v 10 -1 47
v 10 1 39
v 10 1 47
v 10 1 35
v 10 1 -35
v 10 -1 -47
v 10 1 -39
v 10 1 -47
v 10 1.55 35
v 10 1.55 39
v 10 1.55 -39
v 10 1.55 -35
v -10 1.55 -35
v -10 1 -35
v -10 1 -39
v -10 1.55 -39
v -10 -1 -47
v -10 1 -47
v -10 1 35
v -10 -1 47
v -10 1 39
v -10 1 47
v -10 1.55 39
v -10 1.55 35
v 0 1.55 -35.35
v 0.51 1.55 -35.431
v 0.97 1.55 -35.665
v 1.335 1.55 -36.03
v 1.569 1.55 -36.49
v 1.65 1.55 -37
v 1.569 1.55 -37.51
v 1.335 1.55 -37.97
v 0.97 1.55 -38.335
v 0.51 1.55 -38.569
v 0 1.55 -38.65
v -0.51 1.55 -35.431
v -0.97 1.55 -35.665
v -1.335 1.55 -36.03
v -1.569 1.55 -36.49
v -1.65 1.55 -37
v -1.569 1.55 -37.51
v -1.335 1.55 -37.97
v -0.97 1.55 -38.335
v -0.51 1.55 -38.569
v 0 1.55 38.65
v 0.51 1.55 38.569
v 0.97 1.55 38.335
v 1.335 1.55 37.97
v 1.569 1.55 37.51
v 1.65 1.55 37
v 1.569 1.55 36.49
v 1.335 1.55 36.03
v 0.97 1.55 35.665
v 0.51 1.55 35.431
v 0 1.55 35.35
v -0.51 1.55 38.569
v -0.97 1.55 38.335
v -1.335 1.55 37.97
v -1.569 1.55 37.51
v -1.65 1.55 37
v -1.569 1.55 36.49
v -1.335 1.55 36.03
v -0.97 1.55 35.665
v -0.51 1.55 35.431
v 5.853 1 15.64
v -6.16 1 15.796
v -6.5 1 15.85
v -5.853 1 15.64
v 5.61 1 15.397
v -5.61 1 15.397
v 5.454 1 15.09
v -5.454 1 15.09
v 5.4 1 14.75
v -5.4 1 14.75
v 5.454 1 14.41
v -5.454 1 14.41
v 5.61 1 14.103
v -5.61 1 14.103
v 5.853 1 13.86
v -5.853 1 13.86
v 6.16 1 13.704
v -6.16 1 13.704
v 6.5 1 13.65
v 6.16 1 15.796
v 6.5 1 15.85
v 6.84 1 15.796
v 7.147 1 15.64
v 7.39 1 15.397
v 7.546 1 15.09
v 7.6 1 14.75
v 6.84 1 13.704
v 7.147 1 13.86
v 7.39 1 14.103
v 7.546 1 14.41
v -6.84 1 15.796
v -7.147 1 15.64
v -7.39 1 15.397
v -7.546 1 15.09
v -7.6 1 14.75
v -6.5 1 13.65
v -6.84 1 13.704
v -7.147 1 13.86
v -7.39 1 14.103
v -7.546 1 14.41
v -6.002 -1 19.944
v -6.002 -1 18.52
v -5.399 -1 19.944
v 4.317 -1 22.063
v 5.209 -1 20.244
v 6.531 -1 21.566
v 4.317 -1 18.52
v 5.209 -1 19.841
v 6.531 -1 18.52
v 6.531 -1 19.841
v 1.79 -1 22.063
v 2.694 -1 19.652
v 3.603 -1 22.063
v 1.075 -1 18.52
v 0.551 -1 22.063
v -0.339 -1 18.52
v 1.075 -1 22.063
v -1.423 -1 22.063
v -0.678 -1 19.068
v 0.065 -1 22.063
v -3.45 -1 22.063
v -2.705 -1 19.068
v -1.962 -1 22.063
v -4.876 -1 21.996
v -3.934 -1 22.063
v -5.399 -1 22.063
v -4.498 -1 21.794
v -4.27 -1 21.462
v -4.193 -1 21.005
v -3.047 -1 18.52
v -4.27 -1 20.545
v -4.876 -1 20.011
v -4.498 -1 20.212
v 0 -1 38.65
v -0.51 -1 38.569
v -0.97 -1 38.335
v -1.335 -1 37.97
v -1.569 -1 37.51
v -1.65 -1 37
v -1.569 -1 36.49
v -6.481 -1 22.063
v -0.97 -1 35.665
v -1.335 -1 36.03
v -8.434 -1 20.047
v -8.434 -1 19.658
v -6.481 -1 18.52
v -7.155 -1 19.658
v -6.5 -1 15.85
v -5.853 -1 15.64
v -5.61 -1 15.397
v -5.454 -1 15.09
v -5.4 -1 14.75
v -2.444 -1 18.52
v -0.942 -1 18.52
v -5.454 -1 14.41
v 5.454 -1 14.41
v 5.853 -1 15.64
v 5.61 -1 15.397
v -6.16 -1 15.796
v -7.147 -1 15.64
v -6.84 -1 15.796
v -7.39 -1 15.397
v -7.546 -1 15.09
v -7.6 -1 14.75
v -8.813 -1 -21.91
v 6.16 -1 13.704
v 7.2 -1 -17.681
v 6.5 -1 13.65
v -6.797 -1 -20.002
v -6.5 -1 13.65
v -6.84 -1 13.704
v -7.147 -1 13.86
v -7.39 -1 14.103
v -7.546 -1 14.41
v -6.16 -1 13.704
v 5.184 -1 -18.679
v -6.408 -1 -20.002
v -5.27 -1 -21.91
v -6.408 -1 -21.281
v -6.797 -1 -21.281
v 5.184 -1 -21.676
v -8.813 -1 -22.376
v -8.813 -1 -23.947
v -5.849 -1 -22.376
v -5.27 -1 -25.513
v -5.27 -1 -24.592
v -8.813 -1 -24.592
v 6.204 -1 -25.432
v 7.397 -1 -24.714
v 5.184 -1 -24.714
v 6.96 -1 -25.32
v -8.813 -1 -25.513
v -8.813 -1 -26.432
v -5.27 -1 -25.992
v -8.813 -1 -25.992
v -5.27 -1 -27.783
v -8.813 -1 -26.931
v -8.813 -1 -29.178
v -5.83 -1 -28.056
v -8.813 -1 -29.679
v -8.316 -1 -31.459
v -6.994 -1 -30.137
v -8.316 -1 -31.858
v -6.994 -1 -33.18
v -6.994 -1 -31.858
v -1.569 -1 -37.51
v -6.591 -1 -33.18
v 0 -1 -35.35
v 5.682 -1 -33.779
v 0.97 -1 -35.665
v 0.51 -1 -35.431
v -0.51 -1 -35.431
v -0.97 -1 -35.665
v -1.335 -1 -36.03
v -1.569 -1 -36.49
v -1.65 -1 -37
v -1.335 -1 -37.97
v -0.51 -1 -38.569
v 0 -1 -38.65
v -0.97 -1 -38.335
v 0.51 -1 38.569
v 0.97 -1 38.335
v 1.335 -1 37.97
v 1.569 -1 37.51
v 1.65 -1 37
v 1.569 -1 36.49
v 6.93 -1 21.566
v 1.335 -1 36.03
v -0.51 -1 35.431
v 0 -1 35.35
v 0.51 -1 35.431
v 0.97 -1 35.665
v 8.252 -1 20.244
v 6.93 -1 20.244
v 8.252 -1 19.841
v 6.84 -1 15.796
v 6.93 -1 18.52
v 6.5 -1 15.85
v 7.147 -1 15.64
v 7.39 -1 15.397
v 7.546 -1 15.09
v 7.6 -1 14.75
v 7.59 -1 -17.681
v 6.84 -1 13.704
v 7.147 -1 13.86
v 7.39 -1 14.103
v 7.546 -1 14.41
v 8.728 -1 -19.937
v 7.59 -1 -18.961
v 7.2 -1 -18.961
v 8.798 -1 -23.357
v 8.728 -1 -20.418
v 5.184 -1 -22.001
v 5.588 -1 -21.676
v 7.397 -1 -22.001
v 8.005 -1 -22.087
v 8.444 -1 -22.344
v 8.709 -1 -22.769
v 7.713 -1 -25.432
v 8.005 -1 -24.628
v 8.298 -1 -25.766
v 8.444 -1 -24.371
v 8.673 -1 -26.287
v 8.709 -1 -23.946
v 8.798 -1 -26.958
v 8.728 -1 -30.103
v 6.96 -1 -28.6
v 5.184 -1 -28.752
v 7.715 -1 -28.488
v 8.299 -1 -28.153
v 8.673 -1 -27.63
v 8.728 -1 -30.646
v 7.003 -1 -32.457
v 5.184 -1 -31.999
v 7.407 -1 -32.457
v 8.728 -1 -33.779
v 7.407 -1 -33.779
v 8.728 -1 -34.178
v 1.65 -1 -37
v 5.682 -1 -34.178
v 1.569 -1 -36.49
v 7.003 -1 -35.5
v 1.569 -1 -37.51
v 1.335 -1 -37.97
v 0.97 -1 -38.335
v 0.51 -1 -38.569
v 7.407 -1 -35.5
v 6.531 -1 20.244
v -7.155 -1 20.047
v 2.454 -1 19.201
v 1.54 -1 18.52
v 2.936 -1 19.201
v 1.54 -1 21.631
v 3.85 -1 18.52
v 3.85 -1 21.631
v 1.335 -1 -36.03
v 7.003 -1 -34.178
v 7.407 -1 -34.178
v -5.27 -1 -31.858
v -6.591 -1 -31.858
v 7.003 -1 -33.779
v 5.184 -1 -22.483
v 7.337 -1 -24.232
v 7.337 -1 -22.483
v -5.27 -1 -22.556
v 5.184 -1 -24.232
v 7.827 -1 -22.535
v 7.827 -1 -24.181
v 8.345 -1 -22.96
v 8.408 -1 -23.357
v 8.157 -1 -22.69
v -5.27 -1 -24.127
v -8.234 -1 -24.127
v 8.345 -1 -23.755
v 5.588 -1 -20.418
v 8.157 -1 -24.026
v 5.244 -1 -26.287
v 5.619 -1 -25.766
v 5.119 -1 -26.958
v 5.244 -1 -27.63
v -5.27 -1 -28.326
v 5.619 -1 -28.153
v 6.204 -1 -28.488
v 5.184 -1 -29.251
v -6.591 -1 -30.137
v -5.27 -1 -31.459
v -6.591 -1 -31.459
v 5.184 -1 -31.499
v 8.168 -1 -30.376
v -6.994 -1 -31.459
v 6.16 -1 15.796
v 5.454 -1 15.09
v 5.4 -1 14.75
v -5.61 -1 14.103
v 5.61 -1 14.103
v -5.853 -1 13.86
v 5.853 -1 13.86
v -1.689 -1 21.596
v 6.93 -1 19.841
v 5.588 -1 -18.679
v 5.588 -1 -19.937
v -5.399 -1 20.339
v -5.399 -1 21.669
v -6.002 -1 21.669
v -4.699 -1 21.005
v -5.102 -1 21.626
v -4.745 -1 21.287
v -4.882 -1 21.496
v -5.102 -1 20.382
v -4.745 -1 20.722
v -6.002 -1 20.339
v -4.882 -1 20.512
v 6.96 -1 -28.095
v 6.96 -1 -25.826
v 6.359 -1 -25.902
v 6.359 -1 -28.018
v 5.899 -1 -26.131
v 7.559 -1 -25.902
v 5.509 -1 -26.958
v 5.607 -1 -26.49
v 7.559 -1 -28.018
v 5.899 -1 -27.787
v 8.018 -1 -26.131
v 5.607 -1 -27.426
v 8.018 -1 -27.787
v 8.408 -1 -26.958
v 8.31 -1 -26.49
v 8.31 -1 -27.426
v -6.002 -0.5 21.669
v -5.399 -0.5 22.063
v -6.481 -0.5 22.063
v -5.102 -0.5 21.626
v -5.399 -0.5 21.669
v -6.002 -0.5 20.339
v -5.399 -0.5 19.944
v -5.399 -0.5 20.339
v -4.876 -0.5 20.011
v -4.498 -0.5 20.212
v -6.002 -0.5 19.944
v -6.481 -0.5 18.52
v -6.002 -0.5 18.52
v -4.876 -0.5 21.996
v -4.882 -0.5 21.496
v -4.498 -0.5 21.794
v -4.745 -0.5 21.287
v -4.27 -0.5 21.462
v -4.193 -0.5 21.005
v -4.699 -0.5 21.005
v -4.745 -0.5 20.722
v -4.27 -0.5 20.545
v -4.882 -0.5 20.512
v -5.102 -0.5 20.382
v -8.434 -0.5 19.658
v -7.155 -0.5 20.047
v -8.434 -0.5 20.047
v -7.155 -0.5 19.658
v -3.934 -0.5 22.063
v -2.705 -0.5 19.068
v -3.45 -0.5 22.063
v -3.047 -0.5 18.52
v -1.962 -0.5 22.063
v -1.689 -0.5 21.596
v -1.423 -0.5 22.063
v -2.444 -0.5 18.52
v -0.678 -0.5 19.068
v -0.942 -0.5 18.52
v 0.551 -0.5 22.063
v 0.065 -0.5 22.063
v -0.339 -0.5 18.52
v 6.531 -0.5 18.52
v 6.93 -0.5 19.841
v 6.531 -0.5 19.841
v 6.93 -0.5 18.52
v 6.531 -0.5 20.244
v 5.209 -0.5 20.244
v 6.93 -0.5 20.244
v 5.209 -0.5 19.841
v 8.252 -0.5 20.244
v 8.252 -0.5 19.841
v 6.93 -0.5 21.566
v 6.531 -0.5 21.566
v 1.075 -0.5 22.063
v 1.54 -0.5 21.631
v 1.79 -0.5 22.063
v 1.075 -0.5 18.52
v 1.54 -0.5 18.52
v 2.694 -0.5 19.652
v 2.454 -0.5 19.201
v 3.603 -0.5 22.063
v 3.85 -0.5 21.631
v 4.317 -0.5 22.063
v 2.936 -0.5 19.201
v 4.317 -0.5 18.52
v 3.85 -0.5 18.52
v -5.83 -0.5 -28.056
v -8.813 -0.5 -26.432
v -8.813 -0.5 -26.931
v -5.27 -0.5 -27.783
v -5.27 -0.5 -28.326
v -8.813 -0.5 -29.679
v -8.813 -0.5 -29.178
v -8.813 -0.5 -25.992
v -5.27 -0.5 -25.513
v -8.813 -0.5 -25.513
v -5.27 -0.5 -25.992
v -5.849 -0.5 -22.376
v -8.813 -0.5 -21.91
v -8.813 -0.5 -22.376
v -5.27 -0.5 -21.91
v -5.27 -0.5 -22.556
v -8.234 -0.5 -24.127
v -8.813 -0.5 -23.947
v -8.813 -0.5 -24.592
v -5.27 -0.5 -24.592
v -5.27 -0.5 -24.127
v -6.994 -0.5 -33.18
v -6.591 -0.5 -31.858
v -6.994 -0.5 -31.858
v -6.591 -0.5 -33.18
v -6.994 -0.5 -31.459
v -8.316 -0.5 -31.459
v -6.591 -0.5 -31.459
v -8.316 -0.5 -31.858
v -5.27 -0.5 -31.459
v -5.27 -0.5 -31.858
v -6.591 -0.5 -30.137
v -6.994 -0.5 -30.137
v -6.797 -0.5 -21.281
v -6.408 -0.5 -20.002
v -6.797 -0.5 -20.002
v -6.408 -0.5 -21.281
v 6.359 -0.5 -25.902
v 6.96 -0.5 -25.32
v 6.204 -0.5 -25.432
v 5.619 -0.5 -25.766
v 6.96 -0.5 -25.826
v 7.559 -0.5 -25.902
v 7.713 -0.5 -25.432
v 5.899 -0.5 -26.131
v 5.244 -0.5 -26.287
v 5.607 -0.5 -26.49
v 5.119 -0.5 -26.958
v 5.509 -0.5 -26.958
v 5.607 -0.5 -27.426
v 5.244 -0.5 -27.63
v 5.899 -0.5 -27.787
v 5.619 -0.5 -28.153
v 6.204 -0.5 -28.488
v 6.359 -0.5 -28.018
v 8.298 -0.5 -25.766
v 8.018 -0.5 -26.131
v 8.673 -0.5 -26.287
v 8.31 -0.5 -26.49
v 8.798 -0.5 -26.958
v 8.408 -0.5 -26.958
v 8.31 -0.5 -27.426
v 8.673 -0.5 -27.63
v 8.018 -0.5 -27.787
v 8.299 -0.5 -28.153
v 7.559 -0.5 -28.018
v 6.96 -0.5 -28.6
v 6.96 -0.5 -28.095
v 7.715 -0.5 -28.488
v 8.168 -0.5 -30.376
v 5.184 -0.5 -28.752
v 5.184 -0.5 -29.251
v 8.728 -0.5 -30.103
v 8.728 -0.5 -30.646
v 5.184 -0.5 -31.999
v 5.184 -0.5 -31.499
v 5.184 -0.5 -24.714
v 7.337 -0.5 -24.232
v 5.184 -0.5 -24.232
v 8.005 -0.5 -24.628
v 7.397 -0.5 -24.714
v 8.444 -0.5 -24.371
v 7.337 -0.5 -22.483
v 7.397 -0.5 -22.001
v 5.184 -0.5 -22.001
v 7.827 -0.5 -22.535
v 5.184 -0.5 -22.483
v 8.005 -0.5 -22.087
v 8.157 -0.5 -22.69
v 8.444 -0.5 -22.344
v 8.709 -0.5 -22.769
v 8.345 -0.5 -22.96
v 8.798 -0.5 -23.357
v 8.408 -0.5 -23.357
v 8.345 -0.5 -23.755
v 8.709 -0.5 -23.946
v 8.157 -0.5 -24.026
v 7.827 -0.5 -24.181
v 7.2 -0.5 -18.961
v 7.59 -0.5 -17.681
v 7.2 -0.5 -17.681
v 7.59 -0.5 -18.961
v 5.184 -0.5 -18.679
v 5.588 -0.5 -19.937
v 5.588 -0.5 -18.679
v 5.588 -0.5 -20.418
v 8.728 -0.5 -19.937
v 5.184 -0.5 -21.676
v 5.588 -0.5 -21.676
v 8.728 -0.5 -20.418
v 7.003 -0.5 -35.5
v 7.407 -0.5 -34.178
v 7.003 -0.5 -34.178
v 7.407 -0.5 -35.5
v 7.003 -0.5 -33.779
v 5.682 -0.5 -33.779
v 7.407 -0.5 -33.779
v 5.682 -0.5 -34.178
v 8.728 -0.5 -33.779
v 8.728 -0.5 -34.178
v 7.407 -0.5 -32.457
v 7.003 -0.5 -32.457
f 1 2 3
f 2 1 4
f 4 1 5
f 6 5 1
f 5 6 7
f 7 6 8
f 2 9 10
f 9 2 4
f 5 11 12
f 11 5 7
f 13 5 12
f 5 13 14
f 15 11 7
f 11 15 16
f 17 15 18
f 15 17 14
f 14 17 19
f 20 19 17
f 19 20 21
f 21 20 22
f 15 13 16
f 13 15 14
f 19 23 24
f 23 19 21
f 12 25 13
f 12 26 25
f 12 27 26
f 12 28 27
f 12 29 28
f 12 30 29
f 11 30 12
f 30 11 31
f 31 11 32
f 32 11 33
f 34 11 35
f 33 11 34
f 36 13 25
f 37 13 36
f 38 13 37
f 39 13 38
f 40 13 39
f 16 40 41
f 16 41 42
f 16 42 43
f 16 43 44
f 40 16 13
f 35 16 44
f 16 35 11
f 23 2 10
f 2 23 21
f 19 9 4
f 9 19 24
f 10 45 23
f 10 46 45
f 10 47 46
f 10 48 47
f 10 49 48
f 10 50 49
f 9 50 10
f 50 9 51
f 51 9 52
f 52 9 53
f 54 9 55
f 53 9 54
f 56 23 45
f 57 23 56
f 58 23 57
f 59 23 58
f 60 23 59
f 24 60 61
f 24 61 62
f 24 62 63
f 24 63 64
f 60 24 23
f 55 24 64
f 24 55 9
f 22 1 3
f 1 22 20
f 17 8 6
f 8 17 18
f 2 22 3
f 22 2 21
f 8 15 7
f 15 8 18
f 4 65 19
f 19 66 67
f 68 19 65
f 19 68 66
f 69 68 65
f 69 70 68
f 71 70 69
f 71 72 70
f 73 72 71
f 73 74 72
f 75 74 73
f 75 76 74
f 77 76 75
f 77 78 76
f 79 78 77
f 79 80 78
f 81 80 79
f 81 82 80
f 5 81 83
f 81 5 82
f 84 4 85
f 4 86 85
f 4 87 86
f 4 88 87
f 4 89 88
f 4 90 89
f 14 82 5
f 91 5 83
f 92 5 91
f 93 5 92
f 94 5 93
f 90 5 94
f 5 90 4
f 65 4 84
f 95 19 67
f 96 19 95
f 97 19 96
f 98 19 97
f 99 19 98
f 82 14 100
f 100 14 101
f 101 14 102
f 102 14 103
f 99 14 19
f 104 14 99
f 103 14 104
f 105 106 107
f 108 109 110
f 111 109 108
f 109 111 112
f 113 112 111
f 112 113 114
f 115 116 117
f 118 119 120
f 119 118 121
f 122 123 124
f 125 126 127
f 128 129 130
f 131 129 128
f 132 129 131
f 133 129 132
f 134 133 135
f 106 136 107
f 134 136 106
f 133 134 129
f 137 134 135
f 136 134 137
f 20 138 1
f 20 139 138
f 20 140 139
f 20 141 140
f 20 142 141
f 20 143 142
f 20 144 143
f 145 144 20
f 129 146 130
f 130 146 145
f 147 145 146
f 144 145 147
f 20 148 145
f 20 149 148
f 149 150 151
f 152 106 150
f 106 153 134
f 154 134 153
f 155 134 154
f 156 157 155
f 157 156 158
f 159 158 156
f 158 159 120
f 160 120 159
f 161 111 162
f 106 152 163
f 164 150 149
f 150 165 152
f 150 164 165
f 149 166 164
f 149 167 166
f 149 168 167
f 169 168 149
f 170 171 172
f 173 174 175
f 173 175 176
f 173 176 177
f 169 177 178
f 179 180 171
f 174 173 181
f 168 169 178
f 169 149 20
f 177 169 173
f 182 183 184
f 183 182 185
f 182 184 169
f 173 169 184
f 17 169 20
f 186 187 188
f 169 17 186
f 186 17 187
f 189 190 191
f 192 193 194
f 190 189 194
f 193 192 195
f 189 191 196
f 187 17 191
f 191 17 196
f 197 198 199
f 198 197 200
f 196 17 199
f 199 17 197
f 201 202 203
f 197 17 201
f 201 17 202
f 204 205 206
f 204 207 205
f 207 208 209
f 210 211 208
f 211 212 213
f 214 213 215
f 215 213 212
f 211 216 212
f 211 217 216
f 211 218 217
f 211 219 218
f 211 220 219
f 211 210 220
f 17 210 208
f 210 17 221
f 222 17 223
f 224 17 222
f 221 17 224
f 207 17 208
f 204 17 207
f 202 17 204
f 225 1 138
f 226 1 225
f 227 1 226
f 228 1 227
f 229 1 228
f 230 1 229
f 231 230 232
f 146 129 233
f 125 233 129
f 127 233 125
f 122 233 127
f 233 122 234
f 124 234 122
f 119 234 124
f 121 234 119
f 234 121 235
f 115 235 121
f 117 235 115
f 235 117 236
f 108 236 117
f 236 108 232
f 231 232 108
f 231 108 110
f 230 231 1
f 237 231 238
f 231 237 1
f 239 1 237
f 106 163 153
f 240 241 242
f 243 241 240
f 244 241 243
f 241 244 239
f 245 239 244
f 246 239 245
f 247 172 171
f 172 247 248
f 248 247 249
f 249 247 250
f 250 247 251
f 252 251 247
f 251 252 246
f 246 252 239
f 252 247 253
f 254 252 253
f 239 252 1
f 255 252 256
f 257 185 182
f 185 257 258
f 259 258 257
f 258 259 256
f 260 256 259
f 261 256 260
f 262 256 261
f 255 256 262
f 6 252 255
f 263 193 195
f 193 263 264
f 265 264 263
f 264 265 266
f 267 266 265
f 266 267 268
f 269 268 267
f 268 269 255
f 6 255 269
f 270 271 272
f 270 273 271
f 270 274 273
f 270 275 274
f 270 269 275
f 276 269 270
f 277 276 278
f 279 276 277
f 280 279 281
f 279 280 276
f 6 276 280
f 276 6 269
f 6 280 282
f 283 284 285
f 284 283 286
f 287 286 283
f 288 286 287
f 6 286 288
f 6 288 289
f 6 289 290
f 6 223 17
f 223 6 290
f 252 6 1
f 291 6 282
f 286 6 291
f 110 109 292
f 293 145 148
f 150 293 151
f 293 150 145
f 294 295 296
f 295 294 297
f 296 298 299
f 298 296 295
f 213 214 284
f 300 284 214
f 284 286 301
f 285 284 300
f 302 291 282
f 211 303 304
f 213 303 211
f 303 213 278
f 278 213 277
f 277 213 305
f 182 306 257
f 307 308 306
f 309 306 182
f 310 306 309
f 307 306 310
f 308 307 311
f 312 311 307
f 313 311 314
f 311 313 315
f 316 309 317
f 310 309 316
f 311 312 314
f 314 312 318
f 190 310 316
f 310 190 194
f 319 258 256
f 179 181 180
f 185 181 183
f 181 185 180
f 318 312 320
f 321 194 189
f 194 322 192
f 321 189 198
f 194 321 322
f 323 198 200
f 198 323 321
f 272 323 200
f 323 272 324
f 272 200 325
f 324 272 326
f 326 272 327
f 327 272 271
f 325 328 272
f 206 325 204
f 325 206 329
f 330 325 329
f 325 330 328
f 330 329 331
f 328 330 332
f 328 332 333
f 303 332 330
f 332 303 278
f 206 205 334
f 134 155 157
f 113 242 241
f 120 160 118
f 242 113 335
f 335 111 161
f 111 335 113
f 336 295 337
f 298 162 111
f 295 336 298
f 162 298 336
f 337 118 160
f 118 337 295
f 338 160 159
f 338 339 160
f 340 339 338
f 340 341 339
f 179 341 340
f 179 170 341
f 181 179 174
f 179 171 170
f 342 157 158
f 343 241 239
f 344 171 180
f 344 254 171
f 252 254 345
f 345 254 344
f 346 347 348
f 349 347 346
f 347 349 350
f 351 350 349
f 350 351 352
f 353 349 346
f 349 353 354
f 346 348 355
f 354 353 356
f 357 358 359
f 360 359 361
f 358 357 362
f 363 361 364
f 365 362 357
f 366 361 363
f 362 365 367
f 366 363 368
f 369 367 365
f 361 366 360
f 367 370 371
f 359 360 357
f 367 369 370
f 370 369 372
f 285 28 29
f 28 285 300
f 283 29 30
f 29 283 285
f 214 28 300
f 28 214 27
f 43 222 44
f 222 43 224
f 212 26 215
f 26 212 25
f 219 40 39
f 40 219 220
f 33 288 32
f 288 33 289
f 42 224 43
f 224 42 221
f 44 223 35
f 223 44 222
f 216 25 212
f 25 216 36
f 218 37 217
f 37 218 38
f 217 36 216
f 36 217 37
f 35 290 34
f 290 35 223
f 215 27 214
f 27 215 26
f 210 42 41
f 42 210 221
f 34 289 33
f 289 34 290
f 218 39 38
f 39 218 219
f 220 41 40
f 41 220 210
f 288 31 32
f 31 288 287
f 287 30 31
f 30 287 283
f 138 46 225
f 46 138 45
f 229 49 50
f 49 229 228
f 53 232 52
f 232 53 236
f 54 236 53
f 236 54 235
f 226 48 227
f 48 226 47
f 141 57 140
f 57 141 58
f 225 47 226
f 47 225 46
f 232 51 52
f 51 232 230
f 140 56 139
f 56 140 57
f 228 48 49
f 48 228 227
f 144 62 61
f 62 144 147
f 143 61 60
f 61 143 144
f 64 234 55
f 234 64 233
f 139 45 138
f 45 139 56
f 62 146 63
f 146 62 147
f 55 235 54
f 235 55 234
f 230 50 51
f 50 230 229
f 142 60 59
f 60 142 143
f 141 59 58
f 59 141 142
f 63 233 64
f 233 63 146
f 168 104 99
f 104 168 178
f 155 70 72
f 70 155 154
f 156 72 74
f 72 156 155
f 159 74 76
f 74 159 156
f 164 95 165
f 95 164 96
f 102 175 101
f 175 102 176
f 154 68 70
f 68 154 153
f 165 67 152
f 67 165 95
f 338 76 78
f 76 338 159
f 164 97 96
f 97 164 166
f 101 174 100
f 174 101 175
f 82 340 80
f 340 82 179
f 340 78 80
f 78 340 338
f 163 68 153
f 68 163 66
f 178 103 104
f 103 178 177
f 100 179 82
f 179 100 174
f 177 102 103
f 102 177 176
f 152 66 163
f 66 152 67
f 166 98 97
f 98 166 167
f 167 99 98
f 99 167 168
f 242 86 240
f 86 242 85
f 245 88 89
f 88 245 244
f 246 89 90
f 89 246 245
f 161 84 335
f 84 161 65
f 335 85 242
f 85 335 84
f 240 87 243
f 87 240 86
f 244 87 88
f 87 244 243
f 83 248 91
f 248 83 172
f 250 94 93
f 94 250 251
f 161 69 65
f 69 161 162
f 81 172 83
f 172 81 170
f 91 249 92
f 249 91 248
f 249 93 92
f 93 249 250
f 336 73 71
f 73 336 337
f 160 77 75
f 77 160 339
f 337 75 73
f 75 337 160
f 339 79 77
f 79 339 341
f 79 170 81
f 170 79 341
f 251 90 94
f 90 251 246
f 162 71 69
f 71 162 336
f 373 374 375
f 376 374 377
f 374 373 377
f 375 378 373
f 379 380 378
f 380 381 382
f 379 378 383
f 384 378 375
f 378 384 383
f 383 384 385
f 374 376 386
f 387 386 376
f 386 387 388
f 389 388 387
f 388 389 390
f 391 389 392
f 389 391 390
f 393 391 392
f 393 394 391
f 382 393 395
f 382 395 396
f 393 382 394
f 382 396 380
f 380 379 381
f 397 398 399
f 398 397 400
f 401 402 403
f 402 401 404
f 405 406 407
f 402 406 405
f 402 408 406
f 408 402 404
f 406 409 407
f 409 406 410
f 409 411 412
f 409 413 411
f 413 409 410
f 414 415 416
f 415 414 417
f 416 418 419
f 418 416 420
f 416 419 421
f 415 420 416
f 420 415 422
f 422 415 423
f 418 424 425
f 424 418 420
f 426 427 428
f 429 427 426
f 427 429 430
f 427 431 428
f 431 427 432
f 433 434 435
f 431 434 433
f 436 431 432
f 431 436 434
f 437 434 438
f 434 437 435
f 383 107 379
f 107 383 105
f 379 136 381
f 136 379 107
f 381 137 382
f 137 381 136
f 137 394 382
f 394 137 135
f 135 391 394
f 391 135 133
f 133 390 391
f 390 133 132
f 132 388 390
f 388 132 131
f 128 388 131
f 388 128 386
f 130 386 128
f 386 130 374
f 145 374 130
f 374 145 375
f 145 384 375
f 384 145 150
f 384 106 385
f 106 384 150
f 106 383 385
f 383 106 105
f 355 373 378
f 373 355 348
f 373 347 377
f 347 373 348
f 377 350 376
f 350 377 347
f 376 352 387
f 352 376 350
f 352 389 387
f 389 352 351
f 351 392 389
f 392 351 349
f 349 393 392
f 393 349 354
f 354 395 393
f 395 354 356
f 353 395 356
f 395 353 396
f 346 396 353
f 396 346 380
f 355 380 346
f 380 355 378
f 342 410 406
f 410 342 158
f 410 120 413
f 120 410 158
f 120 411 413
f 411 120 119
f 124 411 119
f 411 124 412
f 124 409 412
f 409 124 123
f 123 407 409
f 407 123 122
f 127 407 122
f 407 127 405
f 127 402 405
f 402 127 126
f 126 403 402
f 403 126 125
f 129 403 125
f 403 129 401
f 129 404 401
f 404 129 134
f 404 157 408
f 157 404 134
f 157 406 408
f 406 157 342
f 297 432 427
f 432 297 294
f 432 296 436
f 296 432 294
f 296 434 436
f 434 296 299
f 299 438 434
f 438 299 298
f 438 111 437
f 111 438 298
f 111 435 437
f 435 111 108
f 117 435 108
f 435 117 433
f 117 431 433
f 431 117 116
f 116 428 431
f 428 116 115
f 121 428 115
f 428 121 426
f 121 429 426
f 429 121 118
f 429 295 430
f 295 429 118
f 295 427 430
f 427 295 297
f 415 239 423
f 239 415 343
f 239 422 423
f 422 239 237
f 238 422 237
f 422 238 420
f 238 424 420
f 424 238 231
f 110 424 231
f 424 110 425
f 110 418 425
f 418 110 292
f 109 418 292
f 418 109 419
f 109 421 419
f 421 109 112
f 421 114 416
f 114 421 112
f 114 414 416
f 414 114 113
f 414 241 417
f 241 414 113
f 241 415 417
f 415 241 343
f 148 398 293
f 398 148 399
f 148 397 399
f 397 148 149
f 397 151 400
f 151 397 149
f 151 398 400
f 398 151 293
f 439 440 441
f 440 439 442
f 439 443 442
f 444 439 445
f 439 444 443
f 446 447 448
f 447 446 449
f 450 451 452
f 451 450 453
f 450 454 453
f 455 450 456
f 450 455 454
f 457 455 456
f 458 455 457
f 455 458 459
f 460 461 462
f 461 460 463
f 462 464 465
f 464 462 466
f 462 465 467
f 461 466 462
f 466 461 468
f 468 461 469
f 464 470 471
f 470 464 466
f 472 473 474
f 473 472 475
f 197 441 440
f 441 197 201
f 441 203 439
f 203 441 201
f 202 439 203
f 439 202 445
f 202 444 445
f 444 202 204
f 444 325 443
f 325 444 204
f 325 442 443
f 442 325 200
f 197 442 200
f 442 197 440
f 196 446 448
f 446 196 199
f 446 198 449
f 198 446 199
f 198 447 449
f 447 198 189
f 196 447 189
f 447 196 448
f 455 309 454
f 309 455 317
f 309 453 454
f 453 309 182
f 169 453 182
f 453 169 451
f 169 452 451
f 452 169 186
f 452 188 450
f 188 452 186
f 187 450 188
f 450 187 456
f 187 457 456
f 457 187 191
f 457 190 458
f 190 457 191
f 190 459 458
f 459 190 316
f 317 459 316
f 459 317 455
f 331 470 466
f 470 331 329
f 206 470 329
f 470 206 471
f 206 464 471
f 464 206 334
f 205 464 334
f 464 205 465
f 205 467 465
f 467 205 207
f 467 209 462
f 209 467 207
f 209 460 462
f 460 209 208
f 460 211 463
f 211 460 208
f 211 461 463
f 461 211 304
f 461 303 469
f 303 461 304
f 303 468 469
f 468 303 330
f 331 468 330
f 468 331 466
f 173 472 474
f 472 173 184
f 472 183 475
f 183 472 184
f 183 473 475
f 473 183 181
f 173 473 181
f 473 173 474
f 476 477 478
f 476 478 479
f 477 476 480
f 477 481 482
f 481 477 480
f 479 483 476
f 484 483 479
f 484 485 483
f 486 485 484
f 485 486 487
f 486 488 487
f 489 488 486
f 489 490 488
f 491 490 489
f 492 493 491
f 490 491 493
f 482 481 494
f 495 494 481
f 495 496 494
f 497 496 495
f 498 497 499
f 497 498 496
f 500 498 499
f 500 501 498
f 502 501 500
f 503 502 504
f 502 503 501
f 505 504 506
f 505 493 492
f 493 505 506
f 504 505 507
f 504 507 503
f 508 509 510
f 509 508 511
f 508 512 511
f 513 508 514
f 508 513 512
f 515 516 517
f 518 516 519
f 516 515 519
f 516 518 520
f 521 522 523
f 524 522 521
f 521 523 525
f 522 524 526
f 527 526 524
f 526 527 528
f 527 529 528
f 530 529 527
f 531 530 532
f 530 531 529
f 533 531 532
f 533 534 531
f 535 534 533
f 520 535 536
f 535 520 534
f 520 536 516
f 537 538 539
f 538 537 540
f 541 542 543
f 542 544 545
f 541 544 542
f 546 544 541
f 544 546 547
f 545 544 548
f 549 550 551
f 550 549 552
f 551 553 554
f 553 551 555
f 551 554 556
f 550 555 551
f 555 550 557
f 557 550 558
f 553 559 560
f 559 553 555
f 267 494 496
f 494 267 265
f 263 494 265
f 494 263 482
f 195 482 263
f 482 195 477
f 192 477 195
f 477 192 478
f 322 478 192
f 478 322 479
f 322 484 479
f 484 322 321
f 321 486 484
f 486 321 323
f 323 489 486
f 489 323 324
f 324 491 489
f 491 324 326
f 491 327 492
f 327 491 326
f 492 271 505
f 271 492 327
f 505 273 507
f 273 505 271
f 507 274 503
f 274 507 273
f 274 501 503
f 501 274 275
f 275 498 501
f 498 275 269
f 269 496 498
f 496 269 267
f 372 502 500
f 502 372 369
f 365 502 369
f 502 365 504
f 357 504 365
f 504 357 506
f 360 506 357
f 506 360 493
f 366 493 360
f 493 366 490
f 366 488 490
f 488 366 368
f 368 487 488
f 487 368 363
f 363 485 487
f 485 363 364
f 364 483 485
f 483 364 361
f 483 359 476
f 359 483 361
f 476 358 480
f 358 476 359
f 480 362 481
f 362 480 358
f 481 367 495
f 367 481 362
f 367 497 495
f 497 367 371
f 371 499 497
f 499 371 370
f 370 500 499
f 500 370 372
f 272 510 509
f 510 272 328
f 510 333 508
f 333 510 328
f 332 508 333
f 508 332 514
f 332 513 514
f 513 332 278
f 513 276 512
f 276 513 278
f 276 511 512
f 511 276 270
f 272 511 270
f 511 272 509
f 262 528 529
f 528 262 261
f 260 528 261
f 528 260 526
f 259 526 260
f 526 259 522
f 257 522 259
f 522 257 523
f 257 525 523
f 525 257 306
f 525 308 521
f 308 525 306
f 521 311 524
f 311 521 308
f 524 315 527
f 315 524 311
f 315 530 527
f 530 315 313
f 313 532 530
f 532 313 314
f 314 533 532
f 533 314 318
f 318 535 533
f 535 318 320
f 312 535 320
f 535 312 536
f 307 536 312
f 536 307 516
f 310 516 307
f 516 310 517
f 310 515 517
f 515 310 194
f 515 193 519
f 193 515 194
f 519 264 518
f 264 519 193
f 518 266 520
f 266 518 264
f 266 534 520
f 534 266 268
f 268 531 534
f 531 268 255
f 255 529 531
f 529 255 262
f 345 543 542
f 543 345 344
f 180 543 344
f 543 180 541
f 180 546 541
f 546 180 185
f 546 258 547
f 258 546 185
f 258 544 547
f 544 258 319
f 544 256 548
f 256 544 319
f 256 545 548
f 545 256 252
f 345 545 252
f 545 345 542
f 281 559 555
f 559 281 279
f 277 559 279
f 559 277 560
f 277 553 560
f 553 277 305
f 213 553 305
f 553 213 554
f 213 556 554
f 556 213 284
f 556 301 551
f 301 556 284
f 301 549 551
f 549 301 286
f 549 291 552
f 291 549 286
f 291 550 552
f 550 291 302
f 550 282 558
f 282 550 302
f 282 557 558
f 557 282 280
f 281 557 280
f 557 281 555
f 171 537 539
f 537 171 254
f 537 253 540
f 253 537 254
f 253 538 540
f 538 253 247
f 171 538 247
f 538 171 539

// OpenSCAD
rail_width = 20;
rail_distance = 54;
rail_slot_height = 6;

distance_between_mounting_holes = 54 + 20/2 + 20/2;

pcb_height = 33.5;
pcb_mounting_hole_distance = 13;

bracket_height = 54 + 20 + 20;
bracket_width = 20;

module bracket() {
  difference() {
    union() {
      cube([bracket_width, 2, bracket_height], center=true);
      for (z = [-1, 1]) {
        translate([0, 2/2, z*distance_between_mounting_holes/2])
        cube([bracket_width, 1.1, rail_slot_height-2], center=true);
      }
    }
    for (z = [-1, 1]) {
      translate([0, 0, z*distance_between_mounting_holes/2])
      rotate([90,0,0])
      cylinder(d=3.3, h=10, center=true, $fn=20);
    }
    for (x = [-1, 1]) {
      translate([x*pcb_mounting_hole_distance/2, 0, pcb_height/2 - 2])
      rotate([90,0,0])
      cylinder(d=2.2, h=10, center=true, $fn=20);
    }
    translate([0, -2/2 + 0.5, pcb_height/2 + 4/2 + 1.5])
    rotate([90,0,0])
    linear_extrude(0.51)
    text("-PWM+", size=3.5, halign="center", valign="center", font="Input Mono");
    
    translate([-bracket_width/2 + 4/2 + 1, -2/2 + 0.5, -pcb_height/2 - 4/2 - 8])
    rotate([90,-90,0])
    linear_extrude(0.51)
    text("+VIN-", size=3.5, halign="center", valign="center", font="Input Mono");
    
    translate([bracket_width/2 - 4/2 - 1, -2/2 + 0.5, -pcb_height/2 - 4/2 - 8])
    rotate([90,-90,0])
    linear_extrude(0.51)
    text("+VOUT-", size=3.5, halign="center", valign="center", font="Input Mono");
  }
}

bracket();
